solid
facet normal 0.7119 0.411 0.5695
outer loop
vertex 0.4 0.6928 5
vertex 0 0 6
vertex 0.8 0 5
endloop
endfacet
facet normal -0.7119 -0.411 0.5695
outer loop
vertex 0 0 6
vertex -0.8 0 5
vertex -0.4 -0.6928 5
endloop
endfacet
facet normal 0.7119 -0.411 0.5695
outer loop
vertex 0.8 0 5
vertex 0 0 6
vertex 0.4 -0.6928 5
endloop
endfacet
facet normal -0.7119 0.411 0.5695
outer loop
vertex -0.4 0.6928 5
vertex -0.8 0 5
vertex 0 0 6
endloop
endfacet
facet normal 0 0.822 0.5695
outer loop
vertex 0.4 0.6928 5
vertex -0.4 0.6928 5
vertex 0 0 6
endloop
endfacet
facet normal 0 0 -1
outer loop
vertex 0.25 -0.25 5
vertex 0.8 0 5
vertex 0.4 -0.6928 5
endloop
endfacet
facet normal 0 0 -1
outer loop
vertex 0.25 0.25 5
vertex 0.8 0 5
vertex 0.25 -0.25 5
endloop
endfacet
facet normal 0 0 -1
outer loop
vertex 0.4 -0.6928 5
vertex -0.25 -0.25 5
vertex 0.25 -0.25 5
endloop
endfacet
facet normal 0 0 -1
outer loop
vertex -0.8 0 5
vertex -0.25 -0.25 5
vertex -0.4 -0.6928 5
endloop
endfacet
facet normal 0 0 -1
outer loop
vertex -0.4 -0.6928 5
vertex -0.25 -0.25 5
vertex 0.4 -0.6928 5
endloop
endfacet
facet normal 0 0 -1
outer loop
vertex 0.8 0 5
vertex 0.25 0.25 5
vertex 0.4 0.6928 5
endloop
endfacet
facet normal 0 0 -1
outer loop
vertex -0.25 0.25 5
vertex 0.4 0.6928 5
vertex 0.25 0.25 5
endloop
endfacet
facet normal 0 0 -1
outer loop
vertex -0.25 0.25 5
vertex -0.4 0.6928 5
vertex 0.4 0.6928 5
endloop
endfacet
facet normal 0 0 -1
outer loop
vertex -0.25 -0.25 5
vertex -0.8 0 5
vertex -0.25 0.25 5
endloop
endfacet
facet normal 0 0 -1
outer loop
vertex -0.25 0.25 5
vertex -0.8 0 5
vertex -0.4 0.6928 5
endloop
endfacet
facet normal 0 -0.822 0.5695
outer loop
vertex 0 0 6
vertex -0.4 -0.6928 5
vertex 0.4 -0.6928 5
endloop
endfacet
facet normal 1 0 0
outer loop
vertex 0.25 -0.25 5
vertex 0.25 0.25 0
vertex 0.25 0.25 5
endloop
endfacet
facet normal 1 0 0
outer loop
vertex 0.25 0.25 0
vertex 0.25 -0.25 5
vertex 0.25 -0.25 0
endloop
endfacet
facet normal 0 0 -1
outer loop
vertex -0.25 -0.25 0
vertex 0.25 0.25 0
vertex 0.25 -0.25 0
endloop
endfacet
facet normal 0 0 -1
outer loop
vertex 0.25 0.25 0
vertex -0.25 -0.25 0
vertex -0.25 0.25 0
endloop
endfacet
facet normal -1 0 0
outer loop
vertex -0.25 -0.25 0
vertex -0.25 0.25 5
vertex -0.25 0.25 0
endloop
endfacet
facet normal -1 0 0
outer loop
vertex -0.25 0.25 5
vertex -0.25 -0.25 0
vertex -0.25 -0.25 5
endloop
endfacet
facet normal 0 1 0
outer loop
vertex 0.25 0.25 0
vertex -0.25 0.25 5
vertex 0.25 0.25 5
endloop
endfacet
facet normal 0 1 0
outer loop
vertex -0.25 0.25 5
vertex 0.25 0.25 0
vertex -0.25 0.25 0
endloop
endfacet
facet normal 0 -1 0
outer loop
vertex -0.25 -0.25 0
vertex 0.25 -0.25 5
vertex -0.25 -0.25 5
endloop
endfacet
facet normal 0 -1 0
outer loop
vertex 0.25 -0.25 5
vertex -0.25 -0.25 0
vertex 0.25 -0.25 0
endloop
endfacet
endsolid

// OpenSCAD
use <lib.scad>

function rand(s) = rands(0,1000,1,s)[0]/1000;

module branchHD(s) {
	polyhedron(points = [
		[0.8 + rand(s*2)*0.5,1,0],
		[0,0.8,0],
		[-0.8 - rand(s*3)*0.5,1,0],
		[0,-1.6,0],
		[0,-1.6,-0.5],
	],
	faces = [
		[0,1,2,3],
		[3,4,2],
		[4,2,1],
		[4,1,0],
		[4,3,0],
	]);
}

//branchHD(1);

module layerHD() {
	for (i = [0:60:300]) rotate([0,0,i]) rotate([-30,0,0]) translate([0,1.5,0]) branchHD(i);
}

function offset(i) = [20,-20,15,-15,10,-10][i];

module canopyHD() {
	union() {
		translate([0,0,1.5]) for (i = [0:1:5])
			translate([0,0,i*0.84]) rotate([0,0,offset(i)]) scale([1-(i*0.1),1-(i*0.1),1]) layerHD();
		translate([0,0,5.5]) cyl(0.8,0,1,$fn=6);
		translate([0,0,2.5]) cyl(0.3,0.3,5,$fn=6);
	}
}

module branchLD(s) {
	polyhedron(points = [
		[0.8 + rand(s*2)*0.5,1,0],
		[-0.8 - rand(s*3)*0.5,1,0],
		[0,-1.6,0],
		[0,-1.6,-0.5],
	],
	faces = [
		[0,1,2],
		[3,1,2],
		[3,1,0],
		[3,2,0],
	]);
}

//branchLD(1);

module layerLD() {
	for (i = [0:60:300]) rotate([0,0,i]) rotate([-30,0,0]) translate([0,1.5,0]) branchLD(i);
}

module canopyLD() {
	union() {
		translate([0,0,1.5]) for (i = [0:1:5])
			translate([0,0,i*0.84]) rotate([0,0,offset(i)]) scale([1-(i*0.1),1-(i*0.1),1]) layerLD();
		translate([0,0,5.5]) cyl(0.8,0,1,$fn=6);
		translate([0,0,2.5]) box([0.5,0.5,5]);
	}
}

module branchLD2() {
	translate([0,0,-0.6]) cyl(2.5,0,1.25,$fn=6);
}

module layerLD2() {
	branchLD2();
}

module canopyLD2() {
	union() {
		translate([0,0,1.5]) for (i = [0:1:5])
			translate([0,0,i*0.84]) rotate([0,0,offset(i)]) scale([1-(i*0.1),1-(i*0.1),1]) layerLD2();
		translate([0,0,5.5]) cyl(0.8,0,1,$fn=6);
	}
}

module branchVLD() {
	translate([0,0,-0.6]) cyl(3,0,1.25,$fn=4);
}

module layerVLD() {
	branchVLD();
}

module canopyVLD() {
	union() {
		translate([0,0,1.5]) for (i = [0:1:5])
			translate([0,0,i*0.84]) rotate([0,0,offset(i)]) scale([1-(i*0.1),1-(i*0.1),1]) layerVLD();
	}
}

//translate([-6,0,0])
//	canopyHD();
//translate([0,0,0])
	canopyLD();
//translate([6,0,0])
//	canopyLD2();
//translate([12,0,0])
//	canopyVLD();
